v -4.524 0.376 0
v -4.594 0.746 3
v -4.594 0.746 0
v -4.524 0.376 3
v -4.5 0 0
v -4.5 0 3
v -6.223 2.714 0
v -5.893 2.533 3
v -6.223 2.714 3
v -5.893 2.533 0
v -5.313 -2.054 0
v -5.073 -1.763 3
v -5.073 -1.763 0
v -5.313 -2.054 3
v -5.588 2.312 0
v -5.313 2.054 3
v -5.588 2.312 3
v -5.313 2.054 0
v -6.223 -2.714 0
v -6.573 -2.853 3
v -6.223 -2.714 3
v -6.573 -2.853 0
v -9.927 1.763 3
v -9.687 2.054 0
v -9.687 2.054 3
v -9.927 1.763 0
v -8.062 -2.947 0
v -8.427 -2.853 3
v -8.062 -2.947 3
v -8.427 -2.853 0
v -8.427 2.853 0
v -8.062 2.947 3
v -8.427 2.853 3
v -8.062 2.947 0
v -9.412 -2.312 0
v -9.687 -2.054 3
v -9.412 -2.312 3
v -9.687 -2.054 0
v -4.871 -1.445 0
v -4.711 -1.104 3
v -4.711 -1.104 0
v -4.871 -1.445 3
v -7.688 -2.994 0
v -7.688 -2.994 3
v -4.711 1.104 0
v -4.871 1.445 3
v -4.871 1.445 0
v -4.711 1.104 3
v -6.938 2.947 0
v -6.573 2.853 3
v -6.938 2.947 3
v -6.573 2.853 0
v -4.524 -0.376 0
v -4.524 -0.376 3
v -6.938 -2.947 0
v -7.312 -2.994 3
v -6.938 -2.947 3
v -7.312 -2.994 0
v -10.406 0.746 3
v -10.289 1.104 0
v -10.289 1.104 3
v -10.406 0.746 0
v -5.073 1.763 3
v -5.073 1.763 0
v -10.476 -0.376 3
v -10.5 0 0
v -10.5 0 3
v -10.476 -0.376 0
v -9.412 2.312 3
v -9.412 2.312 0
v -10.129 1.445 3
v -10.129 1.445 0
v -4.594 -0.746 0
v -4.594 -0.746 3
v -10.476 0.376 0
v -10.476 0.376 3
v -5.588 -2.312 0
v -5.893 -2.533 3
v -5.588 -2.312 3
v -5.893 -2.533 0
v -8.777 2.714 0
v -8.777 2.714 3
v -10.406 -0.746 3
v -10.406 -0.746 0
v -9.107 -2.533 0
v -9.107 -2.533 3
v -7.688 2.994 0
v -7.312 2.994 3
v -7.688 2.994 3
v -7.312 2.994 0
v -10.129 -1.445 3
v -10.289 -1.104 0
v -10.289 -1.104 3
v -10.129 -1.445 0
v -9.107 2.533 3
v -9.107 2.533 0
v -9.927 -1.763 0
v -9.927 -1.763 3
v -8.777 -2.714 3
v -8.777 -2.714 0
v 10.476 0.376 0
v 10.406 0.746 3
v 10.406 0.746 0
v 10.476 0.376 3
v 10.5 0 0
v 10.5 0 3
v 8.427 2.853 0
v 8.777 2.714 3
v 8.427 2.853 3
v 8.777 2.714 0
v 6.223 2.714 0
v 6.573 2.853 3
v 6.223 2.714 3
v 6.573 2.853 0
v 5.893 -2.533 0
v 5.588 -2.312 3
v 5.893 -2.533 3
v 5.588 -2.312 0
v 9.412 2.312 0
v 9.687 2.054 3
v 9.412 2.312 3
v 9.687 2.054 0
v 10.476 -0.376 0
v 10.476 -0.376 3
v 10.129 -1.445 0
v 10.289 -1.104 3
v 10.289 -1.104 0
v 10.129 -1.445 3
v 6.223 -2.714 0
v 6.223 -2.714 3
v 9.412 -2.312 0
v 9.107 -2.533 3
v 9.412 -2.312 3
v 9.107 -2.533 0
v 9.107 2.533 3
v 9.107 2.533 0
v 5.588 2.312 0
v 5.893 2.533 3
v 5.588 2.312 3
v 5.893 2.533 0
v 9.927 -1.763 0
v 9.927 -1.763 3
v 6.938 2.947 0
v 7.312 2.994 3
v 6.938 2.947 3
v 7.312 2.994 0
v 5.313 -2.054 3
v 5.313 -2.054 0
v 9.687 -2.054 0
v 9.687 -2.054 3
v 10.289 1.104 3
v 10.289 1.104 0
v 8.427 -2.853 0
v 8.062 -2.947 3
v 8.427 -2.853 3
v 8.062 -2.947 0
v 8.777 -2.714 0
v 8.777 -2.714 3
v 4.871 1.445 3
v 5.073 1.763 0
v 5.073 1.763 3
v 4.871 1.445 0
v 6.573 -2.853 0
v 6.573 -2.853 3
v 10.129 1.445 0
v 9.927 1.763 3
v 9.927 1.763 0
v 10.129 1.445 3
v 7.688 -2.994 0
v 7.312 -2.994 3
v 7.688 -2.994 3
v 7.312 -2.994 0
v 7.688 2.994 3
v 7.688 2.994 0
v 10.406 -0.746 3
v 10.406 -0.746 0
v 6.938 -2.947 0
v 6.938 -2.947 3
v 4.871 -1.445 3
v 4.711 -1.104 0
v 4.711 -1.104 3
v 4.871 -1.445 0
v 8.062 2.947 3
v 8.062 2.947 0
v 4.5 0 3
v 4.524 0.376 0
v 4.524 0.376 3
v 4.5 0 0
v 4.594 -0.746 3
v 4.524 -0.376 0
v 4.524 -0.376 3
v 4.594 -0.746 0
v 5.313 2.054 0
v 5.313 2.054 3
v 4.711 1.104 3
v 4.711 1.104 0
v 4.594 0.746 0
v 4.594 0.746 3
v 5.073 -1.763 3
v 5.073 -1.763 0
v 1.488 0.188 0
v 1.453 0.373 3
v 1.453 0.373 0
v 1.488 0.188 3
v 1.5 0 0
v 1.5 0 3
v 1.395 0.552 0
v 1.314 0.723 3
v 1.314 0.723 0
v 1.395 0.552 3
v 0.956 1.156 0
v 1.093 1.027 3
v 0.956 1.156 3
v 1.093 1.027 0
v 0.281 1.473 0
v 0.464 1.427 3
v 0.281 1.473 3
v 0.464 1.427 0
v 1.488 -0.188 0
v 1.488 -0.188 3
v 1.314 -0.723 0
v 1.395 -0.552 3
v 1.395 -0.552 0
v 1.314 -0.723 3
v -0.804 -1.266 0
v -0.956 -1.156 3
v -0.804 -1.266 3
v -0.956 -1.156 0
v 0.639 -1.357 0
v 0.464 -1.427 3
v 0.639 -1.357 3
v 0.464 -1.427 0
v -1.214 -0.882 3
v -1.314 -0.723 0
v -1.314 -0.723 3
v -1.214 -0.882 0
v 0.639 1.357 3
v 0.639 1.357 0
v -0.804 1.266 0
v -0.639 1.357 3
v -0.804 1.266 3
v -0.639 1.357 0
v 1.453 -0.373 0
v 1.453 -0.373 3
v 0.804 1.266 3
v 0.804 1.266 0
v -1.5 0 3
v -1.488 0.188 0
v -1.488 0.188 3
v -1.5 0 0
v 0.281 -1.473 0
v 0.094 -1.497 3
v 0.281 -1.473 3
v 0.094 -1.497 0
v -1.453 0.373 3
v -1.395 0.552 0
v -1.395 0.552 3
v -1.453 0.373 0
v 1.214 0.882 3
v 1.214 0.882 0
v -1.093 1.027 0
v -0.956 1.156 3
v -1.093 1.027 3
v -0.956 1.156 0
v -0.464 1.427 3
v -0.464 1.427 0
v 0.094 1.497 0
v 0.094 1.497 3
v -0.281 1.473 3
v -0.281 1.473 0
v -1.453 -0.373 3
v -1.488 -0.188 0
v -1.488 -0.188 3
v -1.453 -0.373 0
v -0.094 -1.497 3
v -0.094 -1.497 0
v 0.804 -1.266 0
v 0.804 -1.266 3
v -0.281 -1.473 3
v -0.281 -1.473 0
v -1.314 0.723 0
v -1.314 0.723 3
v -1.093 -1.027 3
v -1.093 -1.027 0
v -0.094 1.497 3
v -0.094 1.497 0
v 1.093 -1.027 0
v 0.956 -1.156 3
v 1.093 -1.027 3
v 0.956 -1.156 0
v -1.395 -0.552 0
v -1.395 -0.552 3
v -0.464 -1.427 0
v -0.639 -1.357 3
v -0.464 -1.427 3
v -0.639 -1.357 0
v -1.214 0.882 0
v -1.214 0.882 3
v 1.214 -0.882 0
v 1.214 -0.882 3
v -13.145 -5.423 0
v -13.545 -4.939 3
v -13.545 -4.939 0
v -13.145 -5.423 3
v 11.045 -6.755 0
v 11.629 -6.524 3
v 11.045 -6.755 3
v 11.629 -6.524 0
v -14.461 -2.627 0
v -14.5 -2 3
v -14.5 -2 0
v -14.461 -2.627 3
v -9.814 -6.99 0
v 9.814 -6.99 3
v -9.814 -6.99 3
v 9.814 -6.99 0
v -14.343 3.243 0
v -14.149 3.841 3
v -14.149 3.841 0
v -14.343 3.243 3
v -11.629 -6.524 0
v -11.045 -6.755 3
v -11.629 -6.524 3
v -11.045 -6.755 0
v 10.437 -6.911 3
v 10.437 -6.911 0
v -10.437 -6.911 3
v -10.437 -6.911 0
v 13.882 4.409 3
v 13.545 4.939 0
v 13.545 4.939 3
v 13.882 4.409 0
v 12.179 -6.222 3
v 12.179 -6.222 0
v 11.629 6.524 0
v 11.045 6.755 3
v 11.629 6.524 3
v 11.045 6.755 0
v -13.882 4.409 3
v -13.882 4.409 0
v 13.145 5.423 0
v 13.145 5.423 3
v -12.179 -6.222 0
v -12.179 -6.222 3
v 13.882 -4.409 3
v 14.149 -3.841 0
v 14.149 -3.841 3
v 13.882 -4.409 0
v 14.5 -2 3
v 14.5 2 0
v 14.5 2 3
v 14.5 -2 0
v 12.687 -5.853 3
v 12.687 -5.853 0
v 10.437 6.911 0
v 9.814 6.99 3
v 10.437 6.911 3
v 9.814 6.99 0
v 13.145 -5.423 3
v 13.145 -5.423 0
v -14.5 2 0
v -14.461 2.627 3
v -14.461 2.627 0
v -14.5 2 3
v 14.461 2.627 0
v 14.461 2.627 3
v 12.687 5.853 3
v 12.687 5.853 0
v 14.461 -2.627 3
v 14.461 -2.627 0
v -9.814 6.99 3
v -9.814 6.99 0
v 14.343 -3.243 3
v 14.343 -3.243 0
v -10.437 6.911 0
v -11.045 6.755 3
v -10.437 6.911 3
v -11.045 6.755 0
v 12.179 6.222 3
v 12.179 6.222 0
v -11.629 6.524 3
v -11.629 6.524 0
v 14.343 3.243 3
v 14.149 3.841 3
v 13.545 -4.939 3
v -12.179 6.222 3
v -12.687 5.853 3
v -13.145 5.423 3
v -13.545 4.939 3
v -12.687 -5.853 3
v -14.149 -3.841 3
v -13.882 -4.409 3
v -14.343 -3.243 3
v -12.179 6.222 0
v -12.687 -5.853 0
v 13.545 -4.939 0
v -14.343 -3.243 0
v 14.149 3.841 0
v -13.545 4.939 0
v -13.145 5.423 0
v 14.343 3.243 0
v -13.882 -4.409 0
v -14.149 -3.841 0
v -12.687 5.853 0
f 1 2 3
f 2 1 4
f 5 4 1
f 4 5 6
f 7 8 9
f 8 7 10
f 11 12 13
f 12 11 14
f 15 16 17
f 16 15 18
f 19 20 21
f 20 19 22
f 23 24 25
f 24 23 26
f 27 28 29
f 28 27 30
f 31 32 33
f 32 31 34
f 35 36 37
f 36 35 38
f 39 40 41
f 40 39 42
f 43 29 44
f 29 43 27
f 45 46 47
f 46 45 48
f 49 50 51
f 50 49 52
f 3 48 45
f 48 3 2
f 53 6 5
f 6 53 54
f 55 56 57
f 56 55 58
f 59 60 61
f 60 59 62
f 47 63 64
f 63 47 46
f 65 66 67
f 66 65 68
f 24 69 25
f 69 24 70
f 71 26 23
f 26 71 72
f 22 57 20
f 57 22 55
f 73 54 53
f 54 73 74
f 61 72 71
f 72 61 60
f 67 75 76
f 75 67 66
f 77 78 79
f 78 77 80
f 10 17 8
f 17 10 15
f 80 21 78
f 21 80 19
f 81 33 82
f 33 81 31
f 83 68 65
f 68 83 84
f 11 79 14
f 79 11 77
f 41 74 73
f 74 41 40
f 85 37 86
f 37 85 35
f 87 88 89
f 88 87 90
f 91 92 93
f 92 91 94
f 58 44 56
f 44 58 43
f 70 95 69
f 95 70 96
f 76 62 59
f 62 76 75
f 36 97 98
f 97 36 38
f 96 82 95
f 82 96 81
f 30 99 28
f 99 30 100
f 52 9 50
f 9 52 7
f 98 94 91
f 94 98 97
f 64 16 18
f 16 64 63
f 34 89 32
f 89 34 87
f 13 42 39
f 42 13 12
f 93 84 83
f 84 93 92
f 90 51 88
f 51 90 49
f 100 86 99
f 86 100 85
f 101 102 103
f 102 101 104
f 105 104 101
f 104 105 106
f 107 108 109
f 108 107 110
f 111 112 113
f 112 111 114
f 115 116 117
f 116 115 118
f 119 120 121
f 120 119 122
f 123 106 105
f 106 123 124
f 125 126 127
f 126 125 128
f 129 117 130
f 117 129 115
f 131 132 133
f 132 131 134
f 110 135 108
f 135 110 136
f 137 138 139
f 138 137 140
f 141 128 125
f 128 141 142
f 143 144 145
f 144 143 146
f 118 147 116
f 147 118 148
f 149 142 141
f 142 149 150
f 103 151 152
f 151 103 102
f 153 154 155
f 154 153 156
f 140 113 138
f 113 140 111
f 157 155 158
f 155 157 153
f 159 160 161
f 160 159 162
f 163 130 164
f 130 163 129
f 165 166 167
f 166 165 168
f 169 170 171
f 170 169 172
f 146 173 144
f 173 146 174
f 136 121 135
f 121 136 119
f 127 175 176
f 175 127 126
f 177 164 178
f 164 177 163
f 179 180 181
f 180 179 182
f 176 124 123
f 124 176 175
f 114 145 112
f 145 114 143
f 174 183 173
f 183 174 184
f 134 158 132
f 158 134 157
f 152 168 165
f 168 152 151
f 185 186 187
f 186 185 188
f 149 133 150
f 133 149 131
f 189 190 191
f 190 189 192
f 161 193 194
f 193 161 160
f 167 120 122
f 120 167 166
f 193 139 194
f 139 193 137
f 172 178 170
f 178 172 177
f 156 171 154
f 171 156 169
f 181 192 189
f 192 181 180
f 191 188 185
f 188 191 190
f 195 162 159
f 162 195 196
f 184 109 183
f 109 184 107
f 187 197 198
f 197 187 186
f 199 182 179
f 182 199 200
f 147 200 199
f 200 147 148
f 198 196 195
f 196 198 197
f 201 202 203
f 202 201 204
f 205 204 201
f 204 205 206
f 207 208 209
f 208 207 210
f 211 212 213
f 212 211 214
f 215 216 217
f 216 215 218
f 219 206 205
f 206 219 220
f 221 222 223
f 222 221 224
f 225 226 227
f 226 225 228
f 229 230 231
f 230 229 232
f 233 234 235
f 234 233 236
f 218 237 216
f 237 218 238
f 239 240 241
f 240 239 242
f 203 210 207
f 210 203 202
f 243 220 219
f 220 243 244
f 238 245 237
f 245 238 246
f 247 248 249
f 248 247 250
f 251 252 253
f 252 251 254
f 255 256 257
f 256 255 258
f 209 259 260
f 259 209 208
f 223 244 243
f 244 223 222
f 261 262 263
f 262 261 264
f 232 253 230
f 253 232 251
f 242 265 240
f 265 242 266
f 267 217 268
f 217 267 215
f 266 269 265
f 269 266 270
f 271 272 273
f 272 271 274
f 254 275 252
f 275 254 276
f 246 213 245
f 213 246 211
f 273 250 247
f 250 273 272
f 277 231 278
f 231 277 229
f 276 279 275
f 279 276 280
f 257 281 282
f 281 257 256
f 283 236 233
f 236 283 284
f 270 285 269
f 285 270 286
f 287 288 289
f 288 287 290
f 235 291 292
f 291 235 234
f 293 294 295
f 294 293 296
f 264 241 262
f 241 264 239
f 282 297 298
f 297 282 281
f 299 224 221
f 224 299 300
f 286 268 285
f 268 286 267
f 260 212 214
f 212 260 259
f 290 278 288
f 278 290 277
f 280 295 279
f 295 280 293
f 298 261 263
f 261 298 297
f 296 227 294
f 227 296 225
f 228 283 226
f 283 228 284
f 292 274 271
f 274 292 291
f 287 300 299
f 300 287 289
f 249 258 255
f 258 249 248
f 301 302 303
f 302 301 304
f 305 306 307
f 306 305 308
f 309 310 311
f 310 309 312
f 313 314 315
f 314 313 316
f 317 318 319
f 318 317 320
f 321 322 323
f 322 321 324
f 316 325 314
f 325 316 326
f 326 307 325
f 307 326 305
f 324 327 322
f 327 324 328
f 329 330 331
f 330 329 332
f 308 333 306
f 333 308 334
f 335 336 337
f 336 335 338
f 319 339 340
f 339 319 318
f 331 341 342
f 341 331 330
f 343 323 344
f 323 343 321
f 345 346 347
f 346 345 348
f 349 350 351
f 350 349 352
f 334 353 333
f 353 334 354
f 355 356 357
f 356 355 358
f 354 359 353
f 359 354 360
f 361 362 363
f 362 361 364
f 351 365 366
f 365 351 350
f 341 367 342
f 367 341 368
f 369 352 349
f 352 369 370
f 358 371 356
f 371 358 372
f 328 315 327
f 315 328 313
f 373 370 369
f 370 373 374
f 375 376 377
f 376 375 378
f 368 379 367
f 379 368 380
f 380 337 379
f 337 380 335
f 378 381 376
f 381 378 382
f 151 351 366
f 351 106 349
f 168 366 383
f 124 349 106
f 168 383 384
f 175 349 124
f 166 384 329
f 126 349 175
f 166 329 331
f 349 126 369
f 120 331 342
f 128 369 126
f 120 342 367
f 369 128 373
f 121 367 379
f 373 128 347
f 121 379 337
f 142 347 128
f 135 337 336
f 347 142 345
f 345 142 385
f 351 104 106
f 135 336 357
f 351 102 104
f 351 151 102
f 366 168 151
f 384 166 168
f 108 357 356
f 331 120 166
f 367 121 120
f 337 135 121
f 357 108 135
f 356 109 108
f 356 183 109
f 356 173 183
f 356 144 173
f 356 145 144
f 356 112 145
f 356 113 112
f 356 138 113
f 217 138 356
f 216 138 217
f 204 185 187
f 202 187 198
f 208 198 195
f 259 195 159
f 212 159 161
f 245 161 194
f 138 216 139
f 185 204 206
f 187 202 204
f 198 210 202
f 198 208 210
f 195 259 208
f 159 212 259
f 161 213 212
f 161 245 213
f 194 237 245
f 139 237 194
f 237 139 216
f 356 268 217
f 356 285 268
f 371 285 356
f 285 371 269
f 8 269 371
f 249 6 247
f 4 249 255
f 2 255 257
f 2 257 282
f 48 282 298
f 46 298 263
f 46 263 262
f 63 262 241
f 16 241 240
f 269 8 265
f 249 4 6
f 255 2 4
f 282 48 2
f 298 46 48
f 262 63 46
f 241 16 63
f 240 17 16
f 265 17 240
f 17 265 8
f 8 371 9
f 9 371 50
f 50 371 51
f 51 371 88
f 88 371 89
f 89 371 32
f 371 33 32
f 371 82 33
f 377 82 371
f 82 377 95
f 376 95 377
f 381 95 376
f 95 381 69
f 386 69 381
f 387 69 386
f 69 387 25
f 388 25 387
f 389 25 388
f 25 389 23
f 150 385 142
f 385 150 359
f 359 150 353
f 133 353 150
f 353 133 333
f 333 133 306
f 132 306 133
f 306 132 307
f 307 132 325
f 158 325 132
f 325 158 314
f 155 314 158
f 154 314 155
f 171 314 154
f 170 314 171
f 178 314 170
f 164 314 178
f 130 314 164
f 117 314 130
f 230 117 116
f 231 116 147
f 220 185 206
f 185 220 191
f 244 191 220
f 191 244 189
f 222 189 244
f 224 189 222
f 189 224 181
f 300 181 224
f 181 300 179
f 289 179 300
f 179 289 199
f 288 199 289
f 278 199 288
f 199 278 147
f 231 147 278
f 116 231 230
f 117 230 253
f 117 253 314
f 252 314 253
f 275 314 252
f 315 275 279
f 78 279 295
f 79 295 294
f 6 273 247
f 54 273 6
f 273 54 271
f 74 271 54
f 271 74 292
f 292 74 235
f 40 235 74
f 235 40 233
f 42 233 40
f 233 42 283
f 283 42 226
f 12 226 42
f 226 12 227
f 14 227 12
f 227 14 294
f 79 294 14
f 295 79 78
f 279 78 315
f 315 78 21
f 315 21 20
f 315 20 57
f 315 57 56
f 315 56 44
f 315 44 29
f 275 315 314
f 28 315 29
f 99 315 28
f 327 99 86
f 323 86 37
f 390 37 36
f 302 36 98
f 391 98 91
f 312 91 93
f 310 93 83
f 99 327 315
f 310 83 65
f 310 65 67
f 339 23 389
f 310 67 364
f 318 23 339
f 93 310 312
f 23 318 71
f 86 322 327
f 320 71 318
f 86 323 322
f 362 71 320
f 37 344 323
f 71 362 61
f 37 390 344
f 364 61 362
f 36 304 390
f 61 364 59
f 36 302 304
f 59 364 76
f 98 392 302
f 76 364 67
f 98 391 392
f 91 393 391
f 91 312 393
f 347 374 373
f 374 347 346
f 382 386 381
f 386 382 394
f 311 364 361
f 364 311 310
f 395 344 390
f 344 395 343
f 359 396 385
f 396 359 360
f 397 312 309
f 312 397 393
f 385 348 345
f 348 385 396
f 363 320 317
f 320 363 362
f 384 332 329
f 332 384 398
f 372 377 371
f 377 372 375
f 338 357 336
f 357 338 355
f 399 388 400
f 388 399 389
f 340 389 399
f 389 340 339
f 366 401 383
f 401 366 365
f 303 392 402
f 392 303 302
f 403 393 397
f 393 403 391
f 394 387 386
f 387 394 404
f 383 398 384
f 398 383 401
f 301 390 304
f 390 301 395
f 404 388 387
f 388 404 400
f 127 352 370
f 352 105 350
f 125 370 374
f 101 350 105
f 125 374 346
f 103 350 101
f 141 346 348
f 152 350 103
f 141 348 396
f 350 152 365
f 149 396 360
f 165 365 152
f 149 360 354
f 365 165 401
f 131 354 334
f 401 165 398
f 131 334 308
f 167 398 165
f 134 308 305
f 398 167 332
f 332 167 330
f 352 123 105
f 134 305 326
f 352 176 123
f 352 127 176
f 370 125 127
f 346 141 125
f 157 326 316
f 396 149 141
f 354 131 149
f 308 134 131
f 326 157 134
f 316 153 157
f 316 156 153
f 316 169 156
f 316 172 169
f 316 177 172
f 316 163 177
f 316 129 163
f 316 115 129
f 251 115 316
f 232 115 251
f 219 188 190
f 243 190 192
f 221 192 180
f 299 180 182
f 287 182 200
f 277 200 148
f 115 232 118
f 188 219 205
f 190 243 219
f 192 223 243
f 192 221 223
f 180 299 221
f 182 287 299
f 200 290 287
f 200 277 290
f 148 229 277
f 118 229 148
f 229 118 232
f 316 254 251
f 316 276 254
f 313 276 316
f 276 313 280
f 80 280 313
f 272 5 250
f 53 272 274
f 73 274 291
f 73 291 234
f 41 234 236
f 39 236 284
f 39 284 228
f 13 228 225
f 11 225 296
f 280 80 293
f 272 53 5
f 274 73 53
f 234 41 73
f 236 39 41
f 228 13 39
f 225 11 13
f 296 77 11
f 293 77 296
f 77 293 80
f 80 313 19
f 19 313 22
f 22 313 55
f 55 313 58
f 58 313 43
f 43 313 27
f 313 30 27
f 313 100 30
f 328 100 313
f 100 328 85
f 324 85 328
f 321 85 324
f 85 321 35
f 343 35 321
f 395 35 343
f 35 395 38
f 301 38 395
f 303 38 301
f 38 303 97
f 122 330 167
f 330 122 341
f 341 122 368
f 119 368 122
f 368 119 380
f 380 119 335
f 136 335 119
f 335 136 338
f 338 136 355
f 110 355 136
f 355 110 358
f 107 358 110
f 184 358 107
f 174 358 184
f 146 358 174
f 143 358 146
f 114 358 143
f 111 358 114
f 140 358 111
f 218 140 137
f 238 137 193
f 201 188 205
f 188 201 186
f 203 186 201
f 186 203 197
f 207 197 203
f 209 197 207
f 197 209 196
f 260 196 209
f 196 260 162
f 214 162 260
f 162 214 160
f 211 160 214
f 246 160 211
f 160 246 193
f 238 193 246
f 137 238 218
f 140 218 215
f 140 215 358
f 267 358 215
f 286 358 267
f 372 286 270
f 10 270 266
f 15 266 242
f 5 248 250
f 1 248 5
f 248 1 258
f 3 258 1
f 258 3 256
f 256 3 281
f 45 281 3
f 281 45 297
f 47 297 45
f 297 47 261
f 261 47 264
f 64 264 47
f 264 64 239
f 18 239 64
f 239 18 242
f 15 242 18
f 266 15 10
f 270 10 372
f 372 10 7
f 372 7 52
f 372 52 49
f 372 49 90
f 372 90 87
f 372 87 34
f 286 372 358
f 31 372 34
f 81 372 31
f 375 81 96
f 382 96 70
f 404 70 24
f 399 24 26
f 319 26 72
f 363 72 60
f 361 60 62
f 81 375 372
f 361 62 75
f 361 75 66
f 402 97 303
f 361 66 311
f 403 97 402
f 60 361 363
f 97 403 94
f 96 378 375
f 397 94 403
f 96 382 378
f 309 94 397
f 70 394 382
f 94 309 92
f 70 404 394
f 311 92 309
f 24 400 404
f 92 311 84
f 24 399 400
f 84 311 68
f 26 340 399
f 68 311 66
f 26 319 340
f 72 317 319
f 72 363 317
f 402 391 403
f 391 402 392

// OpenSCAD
$fn = 50;


difference() {
	union() {
		*color(alpha = 1.0000000000, c = "gray") {
			translate(v = [0, 7, 0]) {
				linear_extrude(height = 1) {
					text(font = "Arial:style=Bold", halign = "center", size = 4.5000000000, text = "COMMENT plate main", valign = "center");
				}
			}
		}
		hull() {
			translate(v = [-9.5000000000, 2.0000000000, 0]) {
				cylinder(h = 3, r = 5);
			}
			translate(v = [9.5000000000, 2.0000000000, 0]) {
				cylinder(h = 3, r = 5);
			}
			translate(v = [-9.5000000000, -2.0000000000, 0]) {
				cylinder(h = 3, r = 5);
			}
			translate(v = [9.5000000000, -2.0000000000, 0]) {
				cylinder(h = 3, r = 5);
			}
		}
	}
	union() {
		*color(alpha = 1.0000000000, c = "gray") {
			translate(v = [0, 7, 0]) {
				linear_extrude(height = 1) {
					text(font = "Arial:style=Bold", halign = "center", size = 4.5000000000, text = "COMMENT holes main", valign = "center");
				}
			}
		}
		translate(v = [-7.5000000000, 0.0000000000, 0]) {
			translate(v = [0, 0, -100]) {
				cylinder(h = 200, r = 3.0000000000);
			}
		}
		translate(v = [7.5000000000, 0.0000000000, 0]) {
			translate(v = [0, 0, -100]) {
				cylinder(h = 200, r = 3.0000000000);
			}
		}
		translate(v = [-7.5000000000, 0.0000000000, 0]) {
			translate(v = [0, 0, -100]) {
				cylinder(h = 200, r = 1.5000000000);
			}
		}
		translate(v = [0, 0, -100]) {
			cylinder(h = 200, r = 1.5000000000);
		}
		translate(v = [7.5000000000, 0.0000000000, 0]) {
			translate(v = [0, 0, -100]) {
				cylinder(h = 200, r = 1.5000000000);
			}
		}
	}
}
